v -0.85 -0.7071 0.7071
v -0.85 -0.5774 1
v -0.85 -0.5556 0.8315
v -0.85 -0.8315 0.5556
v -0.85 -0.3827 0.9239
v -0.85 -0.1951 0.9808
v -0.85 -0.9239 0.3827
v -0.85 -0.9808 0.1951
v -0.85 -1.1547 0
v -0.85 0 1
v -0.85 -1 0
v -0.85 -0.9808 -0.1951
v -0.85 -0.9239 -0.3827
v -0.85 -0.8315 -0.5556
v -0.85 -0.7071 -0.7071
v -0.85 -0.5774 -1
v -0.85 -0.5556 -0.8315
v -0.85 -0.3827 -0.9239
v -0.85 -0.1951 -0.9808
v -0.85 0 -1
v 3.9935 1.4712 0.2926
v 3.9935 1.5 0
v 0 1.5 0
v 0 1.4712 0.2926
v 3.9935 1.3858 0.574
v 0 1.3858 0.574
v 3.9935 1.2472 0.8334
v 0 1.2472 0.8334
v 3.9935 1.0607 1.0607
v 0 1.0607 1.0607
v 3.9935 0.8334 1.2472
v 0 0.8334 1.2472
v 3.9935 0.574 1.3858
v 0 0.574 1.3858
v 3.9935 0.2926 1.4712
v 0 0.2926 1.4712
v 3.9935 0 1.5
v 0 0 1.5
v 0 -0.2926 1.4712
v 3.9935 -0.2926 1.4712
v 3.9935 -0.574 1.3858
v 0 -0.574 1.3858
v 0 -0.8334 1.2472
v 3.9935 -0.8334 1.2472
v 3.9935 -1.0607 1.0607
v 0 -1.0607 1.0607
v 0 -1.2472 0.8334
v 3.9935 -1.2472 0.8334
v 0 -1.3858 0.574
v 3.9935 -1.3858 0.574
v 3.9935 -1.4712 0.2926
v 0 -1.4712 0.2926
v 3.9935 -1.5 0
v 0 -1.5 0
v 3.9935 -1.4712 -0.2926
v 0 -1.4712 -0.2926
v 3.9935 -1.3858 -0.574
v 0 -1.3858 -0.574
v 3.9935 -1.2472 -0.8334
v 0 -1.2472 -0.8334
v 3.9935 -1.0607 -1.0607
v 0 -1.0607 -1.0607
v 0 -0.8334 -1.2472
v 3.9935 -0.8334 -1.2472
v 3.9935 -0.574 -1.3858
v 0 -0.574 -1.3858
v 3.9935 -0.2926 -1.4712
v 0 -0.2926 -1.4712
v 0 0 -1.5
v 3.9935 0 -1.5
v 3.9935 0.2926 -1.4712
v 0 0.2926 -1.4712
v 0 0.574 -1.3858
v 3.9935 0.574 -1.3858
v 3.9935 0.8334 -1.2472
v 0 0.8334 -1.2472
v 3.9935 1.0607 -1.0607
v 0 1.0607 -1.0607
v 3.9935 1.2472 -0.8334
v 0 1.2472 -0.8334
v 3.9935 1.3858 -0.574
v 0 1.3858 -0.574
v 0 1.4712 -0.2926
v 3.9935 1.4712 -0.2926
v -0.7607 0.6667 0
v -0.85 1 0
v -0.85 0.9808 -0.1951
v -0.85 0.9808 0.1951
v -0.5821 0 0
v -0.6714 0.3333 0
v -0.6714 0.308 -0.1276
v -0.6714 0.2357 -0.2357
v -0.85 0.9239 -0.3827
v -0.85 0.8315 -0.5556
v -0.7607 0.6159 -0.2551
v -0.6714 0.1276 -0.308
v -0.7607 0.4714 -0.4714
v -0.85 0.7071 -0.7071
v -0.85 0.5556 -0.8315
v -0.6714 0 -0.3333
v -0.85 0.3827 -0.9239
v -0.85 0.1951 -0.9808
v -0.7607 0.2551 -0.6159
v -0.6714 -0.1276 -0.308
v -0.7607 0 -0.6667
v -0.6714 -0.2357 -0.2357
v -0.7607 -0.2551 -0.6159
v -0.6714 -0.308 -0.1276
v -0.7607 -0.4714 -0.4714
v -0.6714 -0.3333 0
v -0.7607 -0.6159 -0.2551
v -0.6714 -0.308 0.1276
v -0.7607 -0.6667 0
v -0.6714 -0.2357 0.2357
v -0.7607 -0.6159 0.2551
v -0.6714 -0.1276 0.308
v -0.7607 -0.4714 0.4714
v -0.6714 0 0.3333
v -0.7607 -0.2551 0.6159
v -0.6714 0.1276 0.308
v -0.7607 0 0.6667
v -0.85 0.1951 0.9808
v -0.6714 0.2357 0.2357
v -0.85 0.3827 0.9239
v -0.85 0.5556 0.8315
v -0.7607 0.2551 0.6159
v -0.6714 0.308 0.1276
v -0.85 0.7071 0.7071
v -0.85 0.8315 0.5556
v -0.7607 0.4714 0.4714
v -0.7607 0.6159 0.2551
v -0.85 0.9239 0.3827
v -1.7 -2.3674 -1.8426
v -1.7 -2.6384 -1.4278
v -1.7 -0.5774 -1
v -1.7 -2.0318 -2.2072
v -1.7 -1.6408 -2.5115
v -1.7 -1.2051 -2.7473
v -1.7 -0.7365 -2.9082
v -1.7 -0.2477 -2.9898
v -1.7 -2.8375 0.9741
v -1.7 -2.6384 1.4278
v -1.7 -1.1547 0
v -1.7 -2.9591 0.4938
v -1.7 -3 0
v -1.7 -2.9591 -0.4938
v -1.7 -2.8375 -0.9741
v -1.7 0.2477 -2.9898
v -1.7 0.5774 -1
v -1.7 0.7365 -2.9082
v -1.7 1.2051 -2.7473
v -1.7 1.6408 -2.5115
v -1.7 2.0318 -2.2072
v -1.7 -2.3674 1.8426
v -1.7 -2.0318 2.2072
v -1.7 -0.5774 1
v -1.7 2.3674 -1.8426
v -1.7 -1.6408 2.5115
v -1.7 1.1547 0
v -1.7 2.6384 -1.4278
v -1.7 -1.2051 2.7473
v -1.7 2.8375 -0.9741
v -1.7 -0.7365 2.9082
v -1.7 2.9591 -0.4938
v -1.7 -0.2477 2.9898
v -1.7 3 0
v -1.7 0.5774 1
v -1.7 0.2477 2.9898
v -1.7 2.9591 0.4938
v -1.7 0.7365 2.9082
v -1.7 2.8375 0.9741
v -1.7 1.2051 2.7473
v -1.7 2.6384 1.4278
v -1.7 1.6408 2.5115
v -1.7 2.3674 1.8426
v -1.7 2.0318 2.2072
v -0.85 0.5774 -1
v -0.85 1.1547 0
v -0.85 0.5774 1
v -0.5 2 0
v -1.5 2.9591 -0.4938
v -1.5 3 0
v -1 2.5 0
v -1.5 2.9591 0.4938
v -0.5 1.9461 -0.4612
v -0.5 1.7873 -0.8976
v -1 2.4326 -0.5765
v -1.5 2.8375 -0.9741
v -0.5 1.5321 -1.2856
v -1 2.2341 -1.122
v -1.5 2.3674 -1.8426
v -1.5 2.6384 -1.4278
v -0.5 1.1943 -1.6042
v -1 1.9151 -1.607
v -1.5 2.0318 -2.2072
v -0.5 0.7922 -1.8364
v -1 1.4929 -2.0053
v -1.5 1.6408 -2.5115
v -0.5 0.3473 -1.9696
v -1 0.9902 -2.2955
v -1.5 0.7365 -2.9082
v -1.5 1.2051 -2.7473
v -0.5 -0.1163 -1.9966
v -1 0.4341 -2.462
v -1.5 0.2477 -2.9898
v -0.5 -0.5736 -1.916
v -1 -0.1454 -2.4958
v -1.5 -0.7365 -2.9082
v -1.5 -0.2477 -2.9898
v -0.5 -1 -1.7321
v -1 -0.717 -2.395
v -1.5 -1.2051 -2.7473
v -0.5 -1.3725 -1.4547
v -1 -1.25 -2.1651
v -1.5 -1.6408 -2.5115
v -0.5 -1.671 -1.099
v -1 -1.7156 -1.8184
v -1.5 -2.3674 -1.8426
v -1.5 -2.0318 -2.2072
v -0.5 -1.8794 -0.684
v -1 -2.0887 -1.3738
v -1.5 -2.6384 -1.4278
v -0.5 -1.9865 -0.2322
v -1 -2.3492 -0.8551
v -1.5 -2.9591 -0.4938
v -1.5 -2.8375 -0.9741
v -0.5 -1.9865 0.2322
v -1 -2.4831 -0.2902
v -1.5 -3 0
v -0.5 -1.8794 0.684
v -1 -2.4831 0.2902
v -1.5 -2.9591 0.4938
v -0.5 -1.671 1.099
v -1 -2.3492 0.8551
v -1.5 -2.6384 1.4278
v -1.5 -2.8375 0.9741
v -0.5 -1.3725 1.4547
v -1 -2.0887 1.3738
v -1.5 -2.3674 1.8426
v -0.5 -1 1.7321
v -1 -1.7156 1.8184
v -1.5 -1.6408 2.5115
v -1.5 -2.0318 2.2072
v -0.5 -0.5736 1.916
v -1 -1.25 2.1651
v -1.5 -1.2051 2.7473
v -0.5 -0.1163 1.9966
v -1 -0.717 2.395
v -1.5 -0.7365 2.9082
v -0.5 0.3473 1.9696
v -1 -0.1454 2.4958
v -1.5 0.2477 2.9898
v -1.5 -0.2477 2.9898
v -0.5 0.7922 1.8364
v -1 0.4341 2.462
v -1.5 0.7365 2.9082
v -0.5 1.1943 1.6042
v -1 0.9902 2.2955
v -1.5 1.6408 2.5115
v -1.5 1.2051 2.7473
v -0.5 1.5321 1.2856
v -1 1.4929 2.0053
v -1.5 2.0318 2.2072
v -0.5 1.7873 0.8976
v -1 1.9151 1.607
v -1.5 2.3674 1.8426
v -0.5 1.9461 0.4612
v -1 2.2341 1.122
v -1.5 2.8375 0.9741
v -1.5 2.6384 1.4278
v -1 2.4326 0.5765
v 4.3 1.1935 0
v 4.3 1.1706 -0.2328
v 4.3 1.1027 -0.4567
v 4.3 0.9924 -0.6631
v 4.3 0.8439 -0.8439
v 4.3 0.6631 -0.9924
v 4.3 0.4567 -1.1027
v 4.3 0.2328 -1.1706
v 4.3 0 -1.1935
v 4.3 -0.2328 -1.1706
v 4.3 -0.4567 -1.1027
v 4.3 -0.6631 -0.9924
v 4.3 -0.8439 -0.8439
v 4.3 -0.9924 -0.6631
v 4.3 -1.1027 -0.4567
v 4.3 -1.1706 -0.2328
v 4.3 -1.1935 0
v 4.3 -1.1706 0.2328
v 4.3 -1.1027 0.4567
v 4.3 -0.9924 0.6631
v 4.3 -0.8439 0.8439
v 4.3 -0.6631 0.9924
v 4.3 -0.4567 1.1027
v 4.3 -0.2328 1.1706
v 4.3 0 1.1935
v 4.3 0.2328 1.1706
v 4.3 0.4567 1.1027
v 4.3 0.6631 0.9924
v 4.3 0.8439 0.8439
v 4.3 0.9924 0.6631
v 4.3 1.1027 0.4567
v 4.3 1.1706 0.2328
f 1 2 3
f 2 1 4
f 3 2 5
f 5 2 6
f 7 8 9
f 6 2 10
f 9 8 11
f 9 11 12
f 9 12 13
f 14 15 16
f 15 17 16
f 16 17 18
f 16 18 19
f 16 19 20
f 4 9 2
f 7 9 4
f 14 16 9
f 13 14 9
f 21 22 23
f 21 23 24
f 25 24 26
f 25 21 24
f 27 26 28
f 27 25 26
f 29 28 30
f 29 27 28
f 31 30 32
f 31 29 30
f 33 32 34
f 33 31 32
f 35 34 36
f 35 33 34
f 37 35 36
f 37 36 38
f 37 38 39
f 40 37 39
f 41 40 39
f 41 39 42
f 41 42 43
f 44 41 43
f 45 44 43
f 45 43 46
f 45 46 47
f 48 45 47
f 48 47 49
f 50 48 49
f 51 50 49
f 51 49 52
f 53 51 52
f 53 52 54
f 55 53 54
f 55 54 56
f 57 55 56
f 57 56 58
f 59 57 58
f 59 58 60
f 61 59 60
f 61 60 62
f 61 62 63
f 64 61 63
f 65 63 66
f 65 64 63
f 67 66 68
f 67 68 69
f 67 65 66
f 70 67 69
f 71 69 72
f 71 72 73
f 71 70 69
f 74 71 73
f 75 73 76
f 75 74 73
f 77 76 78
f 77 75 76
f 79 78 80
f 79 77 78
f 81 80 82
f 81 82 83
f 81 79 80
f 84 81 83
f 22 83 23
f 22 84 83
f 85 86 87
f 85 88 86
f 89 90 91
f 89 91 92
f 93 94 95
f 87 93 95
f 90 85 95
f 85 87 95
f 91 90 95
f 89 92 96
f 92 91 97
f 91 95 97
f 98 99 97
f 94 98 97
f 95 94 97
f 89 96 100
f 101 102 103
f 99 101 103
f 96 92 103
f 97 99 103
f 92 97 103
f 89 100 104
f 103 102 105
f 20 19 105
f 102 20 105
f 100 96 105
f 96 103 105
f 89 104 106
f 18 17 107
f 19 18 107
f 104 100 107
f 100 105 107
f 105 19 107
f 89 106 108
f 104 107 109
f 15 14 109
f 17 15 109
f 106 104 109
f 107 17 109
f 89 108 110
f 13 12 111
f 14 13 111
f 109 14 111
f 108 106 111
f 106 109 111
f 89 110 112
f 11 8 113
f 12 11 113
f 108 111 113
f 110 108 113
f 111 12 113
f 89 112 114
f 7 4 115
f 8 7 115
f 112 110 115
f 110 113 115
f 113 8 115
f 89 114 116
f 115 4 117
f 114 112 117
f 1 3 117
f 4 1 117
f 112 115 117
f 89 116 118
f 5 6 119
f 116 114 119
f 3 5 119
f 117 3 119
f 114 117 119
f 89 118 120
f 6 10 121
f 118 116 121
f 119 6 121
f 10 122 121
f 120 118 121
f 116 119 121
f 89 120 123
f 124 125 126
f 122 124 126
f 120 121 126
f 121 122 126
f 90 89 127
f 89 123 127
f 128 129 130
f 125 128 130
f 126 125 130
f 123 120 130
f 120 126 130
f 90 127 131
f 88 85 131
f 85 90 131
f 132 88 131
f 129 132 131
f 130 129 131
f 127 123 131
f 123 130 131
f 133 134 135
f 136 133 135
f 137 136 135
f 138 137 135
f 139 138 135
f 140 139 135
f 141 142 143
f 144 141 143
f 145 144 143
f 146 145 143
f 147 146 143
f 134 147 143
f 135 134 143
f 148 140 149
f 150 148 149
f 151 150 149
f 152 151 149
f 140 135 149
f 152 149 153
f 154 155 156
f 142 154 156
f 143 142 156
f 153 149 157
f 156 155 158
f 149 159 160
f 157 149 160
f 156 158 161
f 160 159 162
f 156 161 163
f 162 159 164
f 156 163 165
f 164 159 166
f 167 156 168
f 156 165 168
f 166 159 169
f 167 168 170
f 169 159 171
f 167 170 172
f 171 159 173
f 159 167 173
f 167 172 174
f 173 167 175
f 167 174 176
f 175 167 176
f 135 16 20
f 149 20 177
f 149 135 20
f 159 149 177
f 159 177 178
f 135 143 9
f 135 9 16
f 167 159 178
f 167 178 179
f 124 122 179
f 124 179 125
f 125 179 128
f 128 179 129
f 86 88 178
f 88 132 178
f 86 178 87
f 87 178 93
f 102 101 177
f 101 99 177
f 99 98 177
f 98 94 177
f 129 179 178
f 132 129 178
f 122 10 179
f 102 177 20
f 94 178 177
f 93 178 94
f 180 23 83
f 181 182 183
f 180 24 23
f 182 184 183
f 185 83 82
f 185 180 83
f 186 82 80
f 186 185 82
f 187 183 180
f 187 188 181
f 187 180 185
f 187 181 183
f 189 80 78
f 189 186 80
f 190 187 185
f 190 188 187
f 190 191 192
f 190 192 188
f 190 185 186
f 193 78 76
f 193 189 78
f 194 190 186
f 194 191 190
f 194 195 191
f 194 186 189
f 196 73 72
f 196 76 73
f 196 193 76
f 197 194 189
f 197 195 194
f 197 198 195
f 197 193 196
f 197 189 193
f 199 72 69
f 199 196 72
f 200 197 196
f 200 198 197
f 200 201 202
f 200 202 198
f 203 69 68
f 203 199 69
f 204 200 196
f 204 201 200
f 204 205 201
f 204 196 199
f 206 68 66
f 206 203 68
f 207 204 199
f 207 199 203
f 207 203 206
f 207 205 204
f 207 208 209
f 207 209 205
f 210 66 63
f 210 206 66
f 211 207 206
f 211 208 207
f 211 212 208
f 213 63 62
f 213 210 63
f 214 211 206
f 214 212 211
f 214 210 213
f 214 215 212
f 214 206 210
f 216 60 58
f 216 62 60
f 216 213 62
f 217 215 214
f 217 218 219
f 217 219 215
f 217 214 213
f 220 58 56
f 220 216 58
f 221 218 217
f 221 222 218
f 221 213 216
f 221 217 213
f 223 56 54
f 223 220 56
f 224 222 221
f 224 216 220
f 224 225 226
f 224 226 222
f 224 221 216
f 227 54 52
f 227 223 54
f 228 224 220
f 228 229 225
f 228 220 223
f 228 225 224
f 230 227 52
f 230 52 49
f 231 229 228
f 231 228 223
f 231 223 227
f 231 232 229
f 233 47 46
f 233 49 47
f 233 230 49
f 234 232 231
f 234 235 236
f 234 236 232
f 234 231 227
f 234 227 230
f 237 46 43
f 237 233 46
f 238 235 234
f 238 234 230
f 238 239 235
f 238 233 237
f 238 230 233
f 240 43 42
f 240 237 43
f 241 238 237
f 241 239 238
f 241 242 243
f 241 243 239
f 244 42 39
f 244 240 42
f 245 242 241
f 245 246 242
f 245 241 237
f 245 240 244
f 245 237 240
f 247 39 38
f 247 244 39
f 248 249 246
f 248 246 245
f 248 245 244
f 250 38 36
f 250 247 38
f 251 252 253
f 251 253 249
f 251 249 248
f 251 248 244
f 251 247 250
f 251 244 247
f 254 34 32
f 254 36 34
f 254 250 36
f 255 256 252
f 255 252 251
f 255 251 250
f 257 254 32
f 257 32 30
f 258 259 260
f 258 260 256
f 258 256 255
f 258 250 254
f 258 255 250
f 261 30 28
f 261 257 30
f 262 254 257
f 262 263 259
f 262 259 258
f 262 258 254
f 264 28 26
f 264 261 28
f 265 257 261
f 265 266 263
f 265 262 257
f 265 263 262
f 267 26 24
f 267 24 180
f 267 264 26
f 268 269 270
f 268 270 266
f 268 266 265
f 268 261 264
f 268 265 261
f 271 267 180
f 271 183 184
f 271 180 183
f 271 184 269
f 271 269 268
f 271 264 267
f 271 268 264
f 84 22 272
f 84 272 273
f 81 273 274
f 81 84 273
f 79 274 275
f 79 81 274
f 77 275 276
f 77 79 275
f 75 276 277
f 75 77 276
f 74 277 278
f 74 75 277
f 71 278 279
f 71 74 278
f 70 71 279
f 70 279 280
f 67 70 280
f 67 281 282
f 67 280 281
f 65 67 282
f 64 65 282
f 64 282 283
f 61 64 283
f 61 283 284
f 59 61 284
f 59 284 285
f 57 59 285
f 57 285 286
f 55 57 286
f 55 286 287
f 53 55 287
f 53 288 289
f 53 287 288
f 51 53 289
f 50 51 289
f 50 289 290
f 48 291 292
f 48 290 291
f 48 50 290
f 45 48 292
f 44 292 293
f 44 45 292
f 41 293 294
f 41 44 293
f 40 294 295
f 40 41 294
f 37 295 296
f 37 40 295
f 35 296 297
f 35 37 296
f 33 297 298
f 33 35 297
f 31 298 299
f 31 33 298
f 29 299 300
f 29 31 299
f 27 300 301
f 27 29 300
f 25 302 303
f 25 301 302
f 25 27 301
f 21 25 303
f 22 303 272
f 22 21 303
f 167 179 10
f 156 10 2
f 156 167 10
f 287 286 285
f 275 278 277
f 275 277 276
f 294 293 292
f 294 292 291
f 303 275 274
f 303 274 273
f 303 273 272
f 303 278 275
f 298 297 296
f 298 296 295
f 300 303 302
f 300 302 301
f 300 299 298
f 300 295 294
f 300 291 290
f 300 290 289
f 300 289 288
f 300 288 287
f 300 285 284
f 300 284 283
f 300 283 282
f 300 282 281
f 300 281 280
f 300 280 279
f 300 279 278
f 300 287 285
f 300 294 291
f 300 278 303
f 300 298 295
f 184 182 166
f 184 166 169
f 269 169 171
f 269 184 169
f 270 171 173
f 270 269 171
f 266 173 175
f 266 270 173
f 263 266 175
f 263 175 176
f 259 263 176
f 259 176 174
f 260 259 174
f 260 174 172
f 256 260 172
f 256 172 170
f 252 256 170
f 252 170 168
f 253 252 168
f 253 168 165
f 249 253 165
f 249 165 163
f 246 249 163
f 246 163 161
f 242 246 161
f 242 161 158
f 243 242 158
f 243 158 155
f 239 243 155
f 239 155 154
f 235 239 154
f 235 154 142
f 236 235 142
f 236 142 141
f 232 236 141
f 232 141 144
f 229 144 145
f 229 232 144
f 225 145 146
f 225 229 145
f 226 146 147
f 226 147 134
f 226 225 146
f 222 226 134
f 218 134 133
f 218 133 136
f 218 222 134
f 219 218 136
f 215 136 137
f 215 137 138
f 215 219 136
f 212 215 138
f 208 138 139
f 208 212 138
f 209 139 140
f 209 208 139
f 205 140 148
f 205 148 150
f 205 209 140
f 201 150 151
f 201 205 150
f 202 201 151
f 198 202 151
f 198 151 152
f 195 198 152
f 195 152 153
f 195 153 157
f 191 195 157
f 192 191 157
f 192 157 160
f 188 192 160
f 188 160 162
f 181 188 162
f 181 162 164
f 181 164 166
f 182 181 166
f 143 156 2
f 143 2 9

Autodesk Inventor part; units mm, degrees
sketch "Sketch_1" plane through (0, 0, 0) normal (0, 0, 1) x (1, 0, 0)
  line L0 (4.3, 0) -> (0, 0)
  line L1 (-1.7, 0) -> (-1.7, 3)
  line L2 (-1.7, 3) -> (-1.5, 3)
  line L3 (-1.5, 3) -> (0, 1.5)
  line L4 (0, 1.5) -> (3.9935, 1.5)
  line L5 (3.9935, 1.5) -> (4.3, 1.1935)
  line L6 (4.3, 1.1935) -> (4.3, 0)
  line L7 (4.3, 0) -> (-1.7, 0)
revolve "Revolution1" add sketch "Sketch_1" angle 360 about axis through (4.3, 0, 0) along (1, 0, 0)
thread "Thread1" size "M3x0.5" class "6g" standard "ISO Metric profile" length 3.8 offset 0.5
sketch "Sketch_4" plane through (0, 0, 0) normal (0, 0, 1) x (1, 0, 0)
  line L0 (-0.5821, 0) -> (-1.7, 0)
  line L1 (-1.7, 0) -> (-1.7, 1)
  line L2 (-1.7, 1) -> (-0.85, 1)
  line L3 (-0.85, 1) -> (-0.5821, 0)
  line L4 (-0.5821, 0) -> (-1.7, 0)
revolve "Revolution2" cut sketch "Sketch_4" angle 360 about axis through (-0.5821, 0, 0) along (1, 0, 0)
sketch "Sketch_3" plane through (-1.7, 0, 0) normal (1, 0, 0) x (0, 0, -1)
  line L0 (-1, 0.5774) -> (-1, -0.5774)
  line L1 (-1, -0.5774) -> (0, -1.1547)
  line L2 (0, -1.1547) -> (1, -0.5774)
  line L3 (1, -0.5774) -> (1, 0.5774)
  line L4 (1, 0.5774) -> (0, 1.1547)
  line L5 (0, 1.1547) -> (-1, 0.5774)
extrude "Extrusion1" cut sketch "Sketch_3" along normal blind 0.85
ref_plane "dummy_to_bolt_XY" through (0, 0, 0) normal (1, 0, 0) x (0, 0, -1)
ref_plane "dummy_to_bolt_YZ" through (0, 0, 0) normal (0, 0, -1) x (0, 1, 0)
ref_plane "dummy_to_bolt_ZX" through (0, 0, 0) normal (0, 1, 0) x (1, 0, 0)
ref_plane "bolt_to_nut_XY" through (4.3, 0, 0) normal (1, 0, 0) x (0, 0, -1)
ref_plane "bolt_to_nut_YZ" through (4.3, 0, 0) normal (0, 0, -1) x (0, 1, 0)
ref_plane "bolt_to_nut_ZX" through (4.3, 0, 0) normal (0, 1, 0) x (1, 0, 0)
properties part number "HFBCM3-6"
